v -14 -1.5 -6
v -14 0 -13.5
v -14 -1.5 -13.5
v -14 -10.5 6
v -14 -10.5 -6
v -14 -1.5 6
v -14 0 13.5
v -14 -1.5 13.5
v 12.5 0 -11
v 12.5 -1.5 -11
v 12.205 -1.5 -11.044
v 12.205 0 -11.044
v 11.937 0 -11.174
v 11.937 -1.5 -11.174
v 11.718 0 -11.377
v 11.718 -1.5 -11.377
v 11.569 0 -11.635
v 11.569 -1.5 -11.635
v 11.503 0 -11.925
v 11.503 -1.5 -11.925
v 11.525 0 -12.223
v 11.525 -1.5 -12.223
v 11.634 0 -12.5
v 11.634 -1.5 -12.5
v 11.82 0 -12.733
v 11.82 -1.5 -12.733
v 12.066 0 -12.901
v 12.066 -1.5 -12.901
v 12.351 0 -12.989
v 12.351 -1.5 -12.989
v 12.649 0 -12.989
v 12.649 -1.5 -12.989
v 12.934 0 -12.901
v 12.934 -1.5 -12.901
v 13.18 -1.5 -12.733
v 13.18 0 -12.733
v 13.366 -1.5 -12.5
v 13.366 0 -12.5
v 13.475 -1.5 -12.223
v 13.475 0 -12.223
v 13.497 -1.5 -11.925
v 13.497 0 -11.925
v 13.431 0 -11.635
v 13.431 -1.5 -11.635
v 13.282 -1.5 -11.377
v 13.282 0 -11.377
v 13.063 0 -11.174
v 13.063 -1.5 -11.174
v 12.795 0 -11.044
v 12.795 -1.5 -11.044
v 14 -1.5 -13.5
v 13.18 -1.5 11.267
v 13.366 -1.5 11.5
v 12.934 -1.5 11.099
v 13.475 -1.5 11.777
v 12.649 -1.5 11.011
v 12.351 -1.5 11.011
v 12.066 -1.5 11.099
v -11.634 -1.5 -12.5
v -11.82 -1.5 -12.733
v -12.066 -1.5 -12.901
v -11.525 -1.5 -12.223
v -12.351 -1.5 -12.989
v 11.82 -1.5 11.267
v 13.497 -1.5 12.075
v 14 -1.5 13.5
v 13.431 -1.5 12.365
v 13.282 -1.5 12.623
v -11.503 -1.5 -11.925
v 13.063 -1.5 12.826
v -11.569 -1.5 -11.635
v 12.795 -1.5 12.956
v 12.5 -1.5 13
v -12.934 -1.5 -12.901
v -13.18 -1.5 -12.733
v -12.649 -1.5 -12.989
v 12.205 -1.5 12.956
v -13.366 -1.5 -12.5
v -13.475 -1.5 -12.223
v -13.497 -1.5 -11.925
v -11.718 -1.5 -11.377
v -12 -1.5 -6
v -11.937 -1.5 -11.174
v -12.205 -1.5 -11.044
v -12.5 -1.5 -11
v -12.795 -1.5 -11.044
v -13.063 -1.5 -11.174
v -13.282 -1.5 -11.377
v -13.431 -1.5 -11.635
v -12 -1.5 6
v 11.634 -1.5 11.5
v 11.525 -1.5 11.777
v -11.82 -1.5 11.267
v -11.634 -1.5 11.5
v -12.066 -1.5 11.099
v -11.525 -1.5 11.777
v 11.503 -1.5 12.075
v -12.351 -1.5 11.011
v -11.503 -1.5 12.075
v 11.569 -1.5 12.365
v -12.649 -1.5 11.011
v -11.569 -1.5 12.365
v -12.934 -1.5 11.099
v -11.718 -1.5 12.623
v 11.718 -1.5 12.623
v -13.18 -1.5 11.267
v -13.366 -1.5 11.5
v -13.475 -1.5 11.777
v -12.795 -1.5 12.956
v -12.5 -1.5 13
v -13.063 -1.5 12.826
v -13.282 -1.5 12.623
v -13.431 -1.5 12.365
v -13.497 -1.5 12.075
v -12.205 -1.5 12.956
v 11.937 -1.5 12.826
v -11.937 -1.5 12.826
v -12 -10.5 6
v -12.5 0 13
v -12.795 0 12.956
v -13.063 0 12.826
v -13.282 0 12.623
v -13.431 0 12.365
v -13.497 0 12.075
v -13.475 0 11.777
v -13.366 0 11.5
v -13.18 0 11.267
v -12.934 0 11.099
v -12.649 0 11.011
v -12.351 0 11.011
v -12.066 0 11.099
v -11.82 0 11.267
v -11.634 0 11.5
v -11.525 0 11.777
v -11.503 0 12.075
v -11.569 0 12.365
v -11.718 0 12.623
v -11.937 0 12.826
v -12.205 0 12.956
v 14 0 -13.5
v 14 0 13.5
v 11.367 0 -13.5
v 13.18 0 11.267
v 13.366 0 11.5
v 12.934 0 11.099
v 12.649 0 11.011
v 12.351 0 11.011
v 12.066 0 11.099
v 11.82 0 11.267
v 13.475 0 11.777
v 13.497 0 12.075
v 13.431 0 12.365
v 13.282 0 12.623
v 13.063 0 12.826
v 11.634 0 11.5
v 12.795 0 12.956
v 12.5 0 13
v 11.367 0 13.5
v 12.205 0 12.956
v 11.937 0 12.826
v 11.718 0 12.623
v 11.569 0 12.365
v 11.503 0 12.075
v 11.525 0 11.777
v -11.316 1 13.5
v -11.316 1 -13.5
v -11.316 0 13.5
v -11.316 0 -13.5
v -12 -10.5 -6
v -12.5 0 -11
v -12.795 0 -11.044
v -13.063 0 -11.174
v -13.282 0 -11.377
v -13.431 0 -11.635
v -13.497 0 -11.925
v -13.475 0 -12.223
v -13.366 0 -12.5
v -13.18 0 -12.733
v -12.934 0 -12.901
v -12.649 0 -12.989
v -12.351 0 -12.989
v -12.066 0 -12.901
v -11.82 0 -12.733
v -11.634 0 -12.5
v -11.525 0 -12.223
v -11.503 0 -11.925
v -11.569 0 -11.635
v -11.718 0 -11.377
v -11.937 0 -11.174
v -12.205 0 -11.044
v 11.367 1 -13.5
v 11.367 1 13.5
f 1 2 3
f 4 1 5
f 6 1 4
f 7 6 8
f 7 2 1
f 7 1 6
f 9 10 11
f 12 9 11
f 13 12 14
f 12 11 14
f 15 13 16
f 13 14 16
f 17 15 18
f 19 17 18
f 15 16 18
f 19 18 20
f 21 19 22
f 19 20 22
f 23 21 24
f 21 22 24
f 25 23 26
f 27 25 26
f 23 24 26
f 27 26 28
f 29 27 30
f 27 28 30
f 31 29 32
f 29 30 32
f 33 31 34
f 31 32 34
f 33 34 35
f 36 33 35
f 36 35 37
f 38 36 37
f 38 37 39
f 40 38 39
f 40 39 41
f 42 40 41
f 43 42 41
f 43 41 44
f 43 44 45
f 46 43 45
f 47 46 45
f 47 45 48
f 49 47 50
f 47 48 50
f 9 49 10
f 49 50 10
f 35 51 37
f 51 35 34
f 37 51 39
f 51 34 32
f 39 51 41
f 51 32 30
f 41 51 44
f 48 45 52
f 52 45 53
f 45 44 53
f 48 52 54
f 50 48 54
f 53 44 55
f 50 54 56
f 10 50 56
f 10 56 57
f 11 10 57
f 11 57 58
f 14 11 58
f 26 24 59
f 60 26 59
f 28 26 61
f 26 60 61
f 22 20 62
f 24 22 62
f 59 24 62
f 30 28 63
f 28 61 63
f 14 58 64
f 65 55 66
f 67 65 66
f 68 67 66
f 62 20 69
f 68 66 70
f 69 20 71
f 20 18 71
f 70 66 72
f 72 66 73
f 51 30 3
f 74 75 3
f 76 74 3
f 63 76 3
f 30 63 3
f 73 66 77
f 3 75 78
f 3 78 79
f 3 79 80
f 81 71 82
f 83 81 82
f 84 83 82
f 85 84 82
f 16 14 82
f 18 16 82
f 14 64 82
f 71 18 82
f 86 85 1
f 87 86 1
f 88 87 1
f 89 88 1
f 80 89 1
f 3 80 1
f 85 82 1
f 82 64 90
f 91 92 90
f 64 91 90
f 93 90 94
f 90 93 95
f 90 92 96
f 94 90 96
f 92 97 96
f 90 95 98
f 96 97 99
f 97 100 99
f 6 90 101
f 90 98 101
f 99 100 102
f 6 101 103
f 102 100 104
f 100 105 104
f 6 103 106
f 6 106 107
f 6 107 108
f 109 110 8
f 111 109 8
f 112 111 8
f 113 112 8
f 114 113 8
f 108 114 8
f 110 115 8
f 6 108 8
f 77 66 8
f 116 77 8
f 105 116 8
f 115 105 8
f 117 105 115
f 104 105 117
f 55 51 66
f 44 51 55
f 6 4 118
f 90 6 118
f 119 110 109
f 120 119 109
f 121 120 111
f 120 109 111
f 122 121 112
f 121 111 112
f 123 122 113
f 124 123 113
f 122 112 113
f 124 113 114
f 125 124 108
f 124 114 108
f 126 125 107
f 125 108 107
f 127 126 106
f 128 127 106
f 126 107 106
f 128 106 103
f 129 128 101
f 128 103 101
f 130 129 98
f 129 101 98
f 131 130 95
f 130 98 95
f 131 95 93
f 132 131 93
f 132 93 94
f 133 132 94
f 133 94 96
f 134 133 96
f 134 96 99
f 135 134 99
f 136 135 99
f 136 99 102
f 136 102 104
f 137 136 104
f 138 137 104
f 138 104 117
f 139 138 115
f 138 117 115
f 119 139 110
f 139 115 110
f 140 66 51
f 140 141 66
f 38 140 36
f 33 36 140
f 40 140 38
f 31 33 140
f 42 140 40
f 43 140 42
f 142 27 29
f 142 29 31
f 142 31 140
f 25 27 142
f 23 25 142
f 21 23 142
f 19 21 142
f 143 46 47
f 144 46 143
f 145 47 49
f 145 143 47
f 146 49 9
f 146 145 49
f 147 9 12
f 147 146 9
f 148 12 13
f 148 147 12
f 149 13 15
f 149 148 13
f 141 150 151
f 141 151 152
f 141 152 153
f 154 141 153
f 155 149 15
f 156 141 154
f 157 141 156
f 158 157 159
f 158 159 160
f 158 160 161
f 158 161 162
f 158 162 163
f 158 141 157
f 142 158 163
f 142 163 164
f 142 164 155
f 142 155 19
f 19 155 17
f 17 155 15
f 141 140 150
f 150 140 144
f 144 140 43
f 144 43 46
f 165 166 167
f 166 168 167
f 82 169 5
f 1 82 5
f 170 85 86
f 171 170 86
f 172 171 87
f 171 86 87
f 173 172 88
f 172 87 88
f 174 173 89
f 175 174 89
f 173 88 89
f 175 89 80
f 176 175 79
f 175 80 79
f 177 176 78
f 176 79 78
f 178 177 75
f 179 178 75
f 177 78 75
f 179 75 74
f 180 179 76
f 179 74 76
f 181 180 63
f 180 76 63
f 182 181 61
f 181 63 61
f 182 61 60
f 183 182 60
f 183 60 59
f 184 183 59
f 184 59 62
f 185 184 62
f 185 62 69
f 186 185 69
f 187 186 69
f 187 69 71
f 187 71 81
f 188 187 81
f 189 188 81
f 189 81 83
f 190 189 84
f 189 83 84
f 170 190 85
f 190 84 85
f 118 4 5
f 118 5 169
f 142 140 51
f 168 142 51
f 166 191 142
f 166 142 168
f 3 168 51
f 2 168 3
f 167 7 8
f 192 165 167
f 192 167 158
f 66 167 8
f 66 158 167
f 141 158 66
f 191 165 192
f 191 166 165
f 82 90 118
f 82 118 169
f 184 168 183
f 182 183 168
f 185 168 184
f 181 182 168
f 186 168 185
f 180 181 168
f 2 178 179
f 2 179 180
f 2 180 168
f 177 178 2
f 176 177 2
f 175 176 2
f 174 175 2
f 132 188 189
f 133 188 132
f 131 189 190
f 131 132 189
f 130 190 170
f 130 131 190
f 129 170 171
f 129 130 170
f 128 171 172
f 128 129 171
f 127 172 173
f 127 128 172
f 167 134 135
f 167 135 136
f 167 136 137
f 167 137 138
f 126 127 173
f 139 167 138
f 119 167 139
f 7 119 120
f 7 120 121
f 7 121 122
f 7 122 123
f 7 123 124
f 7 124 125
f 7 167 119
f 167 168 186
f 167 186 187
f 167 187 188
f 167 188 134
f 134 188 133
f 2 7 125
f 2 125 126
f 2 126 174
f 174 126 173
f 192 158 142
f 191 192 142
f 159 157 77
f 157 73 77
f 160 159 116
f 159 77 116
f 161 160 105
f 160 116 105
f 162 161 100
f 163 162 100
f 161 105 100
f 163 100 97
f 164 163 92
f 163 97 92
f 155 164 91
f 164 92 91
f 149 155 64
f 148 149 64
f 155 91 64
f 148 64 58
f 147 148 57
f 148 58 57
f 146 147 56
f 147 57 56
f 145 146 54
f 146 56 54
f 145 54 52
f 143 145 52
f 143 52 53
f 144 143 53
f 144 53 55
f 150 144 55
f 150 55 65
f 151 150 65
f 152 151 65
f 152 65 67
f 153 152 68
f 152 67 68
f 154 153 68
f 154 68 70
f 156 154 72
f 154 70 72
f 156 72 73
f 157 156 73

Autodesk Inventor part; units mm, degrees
ref_plane "YZ Plane" through (0, 0, 0) normal (1, 0, 0) x (0, 1, 0)
ref_plane "XZ Plane" through (0, 0, 0) normal (0, 1, 0) x (-1, 0, 0)
ref_plane "XY Plane" through (0, 0, 0) normal (0, 0, 1) x (1, 0, 0)
sketch "Sketch1" plane through (0, 0, 0) normal (0, 1, 0) x (-1, 0, 0)
  line L0 (14, 13.5) -> (-14, 13.5)
  line L1 (-14, 13.5) -> (-14, -13.5)
  line L2 (-14, -13.5) -> (14, -13.5)
  line L3 (14, -13.5) -> (14, 13.5)
  line L4 (14, 13.5) -> (-14, -13.5) construction
  line L5 (-14, 13.5) -> (14, -13.5) construction
  line L6 (12.5, 12) -> (-12.5, 12)
  line L7 (-12.5, 12) -> (-12.5, -12)
  line L8 (-12.5, -12) -> (12.5, -12)
  line L9 (12.5, -12) -> (12.5, 12)
  point P0 (0, 0)
  dimension "d0" = 28
  dimension "d1" = 27
  dimension "d2" = 1.5
extrude "Extrusion1" add sketch "Sketch1" against normal blind 1.5 contours L3 L2 L1 L0 | L9 L8 L7 L6
hole "Hole1" at (-12.5, 0, 12) at (-12.5, 0, -12) at (12.5, 0, -12) at (12.5, 0, 12) direction (0, -1, 0) diameter 2 end through all
sketch "Sketch2" plane through (0, 0, 0) normal (0, 1, 0) x (1, 0, 0)
  circle A0 centre (12.5, 12) radius 1 construction
  circle A1 centre (-12.5, -12) radius 1 construction
  circle A2 centre (-12.5, 12) radius 1 construction
  circle A3 centre (12.5, -12) radius 1 construction
  line L0 (14, -13.5) -> (14, 13.5) construction
  line L1 (14, 13.5) -> (-14, 13.5) construction
  line L2 (-14, 13.5) -> (-14, -13.5) construction
  line L3 (-14, -13.5) -> (14, -13.5) construction
  line L4 (-11.3162, -13.5) -> (11.3667, -13.5)
  line L5 (11.3667, -13.5) -> (11.3667, 13.5)
  line L6 (11.3667, 13.5) -> (-11.3162, 13.5)
  line L7 (-11.3162, 13.5) -> (-11.3162, -13.5)
  point P0 (0, 0)
extrude "Extrusion2" add sketch "Sketch2" along normal blind 1
sketch "Sketch3" plane through (0, -1.5, 0) normal (0, -1, 0) x (1, 0, 0)
  line L0 (-14, 6) -> (-12, 6)
  line L1 (-12, 6) -> (-12, -6)
  line L2 (-12, -6) -> (-14, -6)
  line L3 (-14, -6) -> (-14, 6)
  line L4 (-14, 6) -> (-12, -6) construction
  line L5 (-12, 6) -> (-14, -6) construction
  line L6 (-14, 13.5) -> (-14, -13.5) projected
  point P0 (0, 0)
  point P1 (-13, 0)
  point P2 (-14, 0)
  dimension "d14" = 2
  dimension "d15" = 12
extrude "Extrusion3" add sketch "Sketch3" along normal blind 9
properties part number "screen_footprint"
